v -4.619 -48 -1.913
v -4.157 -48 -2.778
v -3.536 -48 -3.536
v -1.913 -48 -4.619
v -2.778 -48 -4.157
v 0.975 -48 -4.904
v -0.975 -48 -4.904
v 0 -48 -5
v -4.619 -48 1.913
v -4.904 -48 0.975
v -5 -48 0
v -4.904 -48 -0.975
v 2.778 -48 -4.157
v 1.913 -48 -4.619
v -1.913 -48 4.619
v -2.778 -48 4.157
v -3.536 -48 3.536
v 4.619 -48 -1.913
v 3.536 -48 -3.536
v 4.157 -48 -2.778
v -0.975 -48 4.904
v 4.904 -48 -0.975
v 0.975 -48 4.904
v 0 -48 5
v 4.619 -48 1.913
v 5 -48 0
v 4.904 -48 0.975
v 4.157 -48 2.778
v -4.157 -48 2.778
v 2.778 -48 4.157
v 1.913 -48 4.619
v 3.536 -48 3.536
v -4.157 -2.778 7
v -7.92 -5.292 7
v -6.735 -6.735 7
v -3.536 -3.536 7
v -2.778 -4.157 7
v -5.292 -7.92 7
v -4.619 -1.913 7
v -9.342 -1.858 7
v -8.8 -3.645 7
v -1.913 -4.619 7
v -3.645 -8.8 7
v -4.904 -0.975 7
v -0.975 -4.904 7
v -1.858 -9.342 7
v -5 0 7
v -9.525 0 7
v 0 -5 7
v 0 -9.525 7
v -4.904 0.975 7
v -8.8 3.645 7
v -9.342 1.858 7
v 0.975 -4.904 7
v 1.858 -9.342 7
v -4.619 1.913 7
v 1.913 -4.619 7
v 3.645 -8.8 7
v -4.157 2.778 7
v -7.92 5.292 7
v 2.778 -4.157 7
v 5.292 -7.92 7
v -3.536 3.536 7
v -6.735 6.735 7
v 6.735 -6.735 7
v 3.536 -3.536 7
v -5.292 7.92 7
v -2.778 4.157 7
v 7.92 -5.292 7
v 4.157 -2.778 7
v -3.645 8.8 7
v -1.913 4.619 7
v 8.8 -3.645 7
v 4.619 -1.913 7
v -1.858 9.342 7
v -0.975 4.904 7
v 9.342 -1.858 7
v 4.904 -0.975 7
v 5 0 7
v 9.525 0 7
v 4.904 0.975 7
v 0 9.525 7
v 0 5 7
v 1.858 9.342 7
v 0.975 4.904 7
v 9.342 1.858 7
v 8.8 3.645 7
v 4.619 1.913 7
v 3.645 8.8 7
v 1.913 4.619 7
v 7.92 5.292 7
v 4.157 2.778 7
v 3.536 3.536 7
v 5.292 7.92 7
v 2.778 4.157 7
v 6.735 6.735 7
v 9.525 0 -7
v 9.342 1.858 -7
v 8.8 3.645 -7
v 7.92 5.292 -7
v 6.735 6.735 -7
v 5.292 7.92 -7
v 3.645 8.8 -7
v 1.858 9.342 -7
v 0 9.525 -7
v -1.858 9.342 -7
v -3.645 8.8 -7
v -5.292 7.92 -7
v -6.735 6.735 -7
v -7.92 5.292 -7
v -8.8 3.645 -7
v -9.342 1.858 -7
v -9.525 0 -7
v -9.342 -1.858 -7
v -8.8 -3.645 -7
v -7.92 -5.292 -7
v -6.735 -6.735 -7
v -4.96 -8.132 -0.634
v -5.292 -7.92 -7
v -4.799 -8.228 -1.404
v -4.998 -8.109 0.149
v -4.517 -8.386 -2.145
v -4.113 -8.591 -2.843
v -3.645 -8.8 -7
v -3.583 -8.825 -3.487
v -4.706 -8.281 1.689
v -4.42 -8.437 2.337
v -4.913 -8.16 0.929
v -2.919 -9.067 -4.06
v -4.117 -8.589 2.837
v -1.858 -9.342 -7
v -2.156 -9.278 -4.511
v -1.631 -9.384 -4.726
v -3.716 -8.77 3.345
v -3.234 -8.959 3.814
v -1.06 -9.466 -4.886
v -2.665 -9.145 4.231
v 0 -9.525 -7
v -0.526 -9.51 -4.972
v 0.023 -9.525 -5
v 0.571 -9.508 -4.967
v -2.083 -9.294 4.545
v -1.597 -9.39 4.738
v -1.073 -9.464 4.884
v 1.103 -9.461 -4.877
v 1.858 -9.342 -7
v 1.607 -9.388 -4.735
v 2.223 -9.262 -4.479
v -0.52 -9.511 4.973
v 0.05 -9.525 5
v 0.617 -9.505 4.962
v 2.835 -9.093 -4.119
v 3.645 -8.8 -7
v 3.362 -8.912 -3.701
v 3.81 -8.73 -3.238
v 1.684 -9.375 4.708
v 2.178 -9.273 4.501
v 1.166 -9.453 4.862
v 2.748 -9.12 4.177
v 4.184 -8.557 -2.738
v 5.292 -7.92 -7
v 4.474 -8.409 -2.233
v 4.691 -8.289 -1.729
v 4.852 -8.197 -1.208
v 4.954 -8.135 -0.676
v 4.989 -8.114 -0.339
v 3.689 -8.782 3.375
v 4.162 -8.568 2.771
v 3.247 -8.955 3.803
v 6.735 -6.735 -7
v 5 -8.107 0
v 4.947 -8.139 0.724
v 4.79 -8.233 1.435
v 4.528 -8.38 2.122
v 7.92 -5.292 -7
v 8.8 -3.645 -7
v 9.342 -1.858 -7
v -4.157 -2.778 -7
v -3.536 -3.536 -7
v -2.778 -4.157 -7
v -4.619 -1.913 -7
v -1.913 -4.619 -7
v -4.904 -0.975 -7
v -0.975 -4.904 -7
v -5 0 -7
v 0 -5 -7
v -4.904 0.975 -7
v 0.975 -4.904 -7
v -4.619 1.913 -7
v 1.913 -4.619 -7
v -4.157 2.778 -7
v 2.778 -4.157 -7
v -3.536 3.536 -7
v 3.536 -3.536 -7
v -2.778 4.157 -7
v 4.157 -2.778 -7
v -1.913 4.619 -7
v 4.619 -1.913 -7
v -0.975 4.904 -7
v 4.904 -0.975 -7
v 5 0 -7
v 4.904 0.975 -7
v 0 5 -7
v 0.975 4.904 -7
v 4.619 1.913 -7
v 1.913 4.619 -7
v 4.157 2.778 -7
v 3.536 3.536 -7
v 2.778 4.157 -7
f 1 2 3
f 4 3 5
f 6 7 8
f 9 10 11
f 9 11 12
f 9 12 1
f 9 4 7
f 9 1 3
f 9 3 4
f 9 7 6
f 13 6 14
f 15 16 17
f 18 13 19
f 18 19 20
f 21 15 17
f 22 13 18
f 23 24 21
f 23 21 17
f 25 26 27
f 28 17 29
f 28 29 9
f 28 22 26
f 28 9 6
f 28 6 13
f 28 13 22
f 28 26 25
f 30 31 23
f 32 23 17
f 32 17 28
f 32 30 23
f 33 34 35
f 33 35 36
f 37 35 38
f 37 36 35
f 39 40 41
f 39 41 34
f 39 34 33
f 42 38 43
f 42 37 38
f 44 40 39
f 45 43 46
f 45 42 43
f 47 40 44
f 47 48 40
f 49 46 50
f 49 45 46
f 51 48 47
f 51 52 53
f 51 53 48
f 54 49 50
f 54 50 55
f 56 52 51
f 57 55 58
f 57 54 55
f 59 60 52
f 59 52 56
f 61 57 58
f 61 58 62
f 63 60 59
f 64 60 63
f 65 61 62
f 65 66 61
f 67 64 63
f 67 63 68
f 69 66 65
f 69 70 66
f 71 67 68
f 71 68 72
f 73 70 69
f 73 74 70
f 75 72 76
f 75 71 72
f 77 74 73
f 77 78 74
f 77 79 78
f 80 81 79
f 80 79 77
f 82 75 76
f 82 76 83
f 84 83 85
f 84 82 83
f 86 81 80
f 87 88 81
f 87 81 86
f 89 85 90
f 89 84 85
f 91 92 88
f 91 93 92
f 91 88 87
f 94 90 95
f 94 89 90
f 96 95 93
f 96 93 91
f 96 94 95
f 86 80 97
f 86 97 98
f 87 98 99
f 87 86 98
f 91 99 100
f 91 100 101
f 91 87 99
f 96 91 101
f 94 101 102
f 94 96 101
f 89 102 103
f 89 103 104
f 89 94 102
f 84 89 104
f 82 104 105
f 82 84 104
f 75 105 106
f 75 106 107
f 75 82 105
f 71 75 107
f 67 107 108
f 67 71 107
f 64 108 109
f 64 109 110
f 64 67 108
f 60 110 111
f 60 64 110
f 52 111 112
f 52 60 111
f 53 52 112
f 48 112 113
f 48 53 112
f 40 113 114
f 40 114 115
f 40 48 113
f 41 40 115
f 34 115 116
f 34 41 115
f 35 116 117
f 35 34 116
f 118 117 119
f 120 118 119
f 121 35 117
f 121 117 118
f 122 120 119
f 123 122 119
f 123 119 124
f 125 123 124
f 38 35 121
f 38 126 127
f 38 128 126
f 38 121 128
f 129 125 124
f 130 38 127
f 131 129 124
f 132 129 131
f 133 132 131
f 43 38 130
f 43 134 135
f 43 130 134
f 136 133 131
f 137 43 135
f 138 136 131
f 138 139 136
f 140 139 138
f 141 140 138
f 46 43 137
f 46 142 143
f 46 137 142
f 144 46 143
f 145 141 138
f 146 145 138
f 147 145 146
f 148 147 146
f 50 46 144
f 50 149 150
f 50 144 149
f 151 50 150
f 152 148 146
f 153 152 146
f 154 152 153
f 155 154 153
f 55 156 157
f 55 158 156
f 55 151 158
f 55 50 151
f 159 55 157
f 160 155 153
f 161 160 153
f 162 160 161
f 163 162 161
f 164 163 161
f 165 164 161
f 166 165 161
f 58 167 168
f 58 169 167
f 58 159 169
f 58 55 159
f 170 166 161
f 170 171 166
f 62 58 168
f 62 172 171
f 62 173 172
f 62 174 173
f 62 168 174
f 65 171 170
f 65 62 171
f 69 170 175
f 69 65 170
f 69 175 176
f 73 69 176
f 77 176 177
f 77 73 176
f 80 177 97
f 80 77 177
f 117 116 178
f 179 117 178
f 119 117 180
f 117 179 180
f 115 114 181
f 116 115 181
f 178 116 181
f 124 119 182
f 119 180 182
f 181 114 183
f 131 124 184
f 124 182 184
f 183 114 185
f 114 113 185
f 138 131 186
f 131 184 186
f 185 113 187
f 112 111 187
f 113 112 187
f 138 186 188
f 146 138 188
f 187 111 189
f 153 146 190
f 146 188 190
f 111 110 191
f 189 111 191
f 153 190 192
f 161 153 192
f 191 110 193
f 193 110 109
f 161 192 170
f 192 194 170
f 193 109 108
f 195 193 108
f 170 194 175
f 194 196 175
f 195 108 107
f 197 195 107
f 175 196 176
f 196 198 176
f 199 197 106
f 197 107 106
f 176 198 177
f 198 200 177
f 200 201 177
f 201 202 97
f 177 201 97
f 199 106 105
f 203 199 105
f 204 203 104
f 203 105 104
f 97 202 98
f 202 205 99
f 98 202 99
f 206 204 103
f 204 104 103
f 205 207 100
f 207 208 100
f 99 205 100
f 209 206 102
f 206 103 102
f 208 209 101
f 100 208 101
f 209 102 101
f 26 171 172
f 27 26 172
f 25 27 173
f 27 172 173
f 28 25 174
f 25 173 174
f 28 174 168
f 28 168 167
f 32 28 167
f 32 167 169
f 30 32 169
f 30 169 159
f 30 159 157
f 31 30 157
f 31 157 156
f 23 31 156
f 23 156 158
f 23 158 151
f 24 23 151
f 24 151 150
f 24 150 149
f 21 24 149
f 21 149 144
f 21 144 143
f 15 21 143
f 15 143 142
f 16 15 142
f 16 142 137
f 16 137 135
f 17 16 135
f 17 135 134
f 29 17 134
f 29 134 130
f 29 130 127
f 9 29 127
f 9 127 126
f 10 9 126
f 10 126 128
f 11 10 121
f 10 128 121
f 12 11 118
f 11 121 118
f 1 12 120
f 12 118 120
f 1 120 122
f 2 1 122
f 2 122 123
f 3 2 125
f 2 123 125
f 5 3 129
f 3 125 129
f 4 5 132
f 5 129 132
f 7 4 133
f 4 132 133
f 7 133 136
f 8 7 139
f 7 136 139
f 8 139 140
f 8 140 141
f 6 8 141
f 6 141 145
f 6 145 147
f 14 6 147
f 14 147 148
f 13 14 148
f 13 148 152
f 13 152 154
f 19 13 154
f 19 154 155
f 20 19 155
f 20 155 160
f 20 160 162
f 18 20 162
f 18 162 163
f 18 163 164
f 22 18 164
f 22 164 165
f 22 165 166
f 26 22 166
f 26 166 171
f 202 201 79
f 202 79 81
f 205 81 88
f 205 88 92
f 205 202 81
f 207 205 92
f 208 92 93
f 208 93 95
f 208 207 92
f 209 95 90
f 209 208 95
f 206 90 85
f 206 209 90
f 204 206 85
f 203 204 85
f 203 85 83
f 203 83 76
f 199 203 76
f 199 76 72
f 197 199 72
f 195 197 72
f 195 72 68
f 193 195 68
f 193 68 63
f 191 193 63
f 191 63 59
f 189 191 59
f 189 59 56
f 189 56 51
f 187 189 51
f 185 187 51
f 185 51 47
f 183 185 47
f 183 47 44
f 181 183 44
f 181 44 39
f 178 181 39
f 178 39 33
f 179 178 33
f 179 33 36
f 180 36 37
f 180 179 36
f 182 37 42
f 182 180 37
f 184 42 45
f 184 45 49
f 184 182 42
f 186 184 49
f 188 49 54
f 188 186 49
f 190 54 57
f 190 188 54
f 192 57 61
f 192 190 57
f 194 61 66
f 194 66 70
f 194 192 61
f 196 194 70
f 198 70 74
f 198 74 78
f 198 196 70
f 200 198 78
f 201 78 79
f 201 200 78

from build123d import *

# Parameters (mm, degrees)
F0_R     = 9.525
F0_R_2   = 5
F1_DEPTH = 7
F2_R     = 5
F3_DEPTH = 48
F4_R     = 5
F5_DEPTH = 12.5


with BuildPart() as f1:
    # F0 (on Top) → F1 (new body, symmetric)
    with BuildSketch(Plane.XY):
        Circle(F0_R)
        Circle(F0_R_2, mode=Mode.SUBTRACT)
    extrude(amount=F1_DEPTH, both=True)

    # F2 (on Front) → F3 (join)
    with BuildSketch(Plane.XZ):
        Circle(F2_R)
    extrude(amount=F3_DEPTH)

    # F4 (on Top) → F5 (cut, symmetric)
    with BuildSketch(Plane.XY):
        Circle(F4_R)
    extrude(amount=F5_DEPTH, both=True, mode=Mode.SUBTRACT)


solid = f1.part
